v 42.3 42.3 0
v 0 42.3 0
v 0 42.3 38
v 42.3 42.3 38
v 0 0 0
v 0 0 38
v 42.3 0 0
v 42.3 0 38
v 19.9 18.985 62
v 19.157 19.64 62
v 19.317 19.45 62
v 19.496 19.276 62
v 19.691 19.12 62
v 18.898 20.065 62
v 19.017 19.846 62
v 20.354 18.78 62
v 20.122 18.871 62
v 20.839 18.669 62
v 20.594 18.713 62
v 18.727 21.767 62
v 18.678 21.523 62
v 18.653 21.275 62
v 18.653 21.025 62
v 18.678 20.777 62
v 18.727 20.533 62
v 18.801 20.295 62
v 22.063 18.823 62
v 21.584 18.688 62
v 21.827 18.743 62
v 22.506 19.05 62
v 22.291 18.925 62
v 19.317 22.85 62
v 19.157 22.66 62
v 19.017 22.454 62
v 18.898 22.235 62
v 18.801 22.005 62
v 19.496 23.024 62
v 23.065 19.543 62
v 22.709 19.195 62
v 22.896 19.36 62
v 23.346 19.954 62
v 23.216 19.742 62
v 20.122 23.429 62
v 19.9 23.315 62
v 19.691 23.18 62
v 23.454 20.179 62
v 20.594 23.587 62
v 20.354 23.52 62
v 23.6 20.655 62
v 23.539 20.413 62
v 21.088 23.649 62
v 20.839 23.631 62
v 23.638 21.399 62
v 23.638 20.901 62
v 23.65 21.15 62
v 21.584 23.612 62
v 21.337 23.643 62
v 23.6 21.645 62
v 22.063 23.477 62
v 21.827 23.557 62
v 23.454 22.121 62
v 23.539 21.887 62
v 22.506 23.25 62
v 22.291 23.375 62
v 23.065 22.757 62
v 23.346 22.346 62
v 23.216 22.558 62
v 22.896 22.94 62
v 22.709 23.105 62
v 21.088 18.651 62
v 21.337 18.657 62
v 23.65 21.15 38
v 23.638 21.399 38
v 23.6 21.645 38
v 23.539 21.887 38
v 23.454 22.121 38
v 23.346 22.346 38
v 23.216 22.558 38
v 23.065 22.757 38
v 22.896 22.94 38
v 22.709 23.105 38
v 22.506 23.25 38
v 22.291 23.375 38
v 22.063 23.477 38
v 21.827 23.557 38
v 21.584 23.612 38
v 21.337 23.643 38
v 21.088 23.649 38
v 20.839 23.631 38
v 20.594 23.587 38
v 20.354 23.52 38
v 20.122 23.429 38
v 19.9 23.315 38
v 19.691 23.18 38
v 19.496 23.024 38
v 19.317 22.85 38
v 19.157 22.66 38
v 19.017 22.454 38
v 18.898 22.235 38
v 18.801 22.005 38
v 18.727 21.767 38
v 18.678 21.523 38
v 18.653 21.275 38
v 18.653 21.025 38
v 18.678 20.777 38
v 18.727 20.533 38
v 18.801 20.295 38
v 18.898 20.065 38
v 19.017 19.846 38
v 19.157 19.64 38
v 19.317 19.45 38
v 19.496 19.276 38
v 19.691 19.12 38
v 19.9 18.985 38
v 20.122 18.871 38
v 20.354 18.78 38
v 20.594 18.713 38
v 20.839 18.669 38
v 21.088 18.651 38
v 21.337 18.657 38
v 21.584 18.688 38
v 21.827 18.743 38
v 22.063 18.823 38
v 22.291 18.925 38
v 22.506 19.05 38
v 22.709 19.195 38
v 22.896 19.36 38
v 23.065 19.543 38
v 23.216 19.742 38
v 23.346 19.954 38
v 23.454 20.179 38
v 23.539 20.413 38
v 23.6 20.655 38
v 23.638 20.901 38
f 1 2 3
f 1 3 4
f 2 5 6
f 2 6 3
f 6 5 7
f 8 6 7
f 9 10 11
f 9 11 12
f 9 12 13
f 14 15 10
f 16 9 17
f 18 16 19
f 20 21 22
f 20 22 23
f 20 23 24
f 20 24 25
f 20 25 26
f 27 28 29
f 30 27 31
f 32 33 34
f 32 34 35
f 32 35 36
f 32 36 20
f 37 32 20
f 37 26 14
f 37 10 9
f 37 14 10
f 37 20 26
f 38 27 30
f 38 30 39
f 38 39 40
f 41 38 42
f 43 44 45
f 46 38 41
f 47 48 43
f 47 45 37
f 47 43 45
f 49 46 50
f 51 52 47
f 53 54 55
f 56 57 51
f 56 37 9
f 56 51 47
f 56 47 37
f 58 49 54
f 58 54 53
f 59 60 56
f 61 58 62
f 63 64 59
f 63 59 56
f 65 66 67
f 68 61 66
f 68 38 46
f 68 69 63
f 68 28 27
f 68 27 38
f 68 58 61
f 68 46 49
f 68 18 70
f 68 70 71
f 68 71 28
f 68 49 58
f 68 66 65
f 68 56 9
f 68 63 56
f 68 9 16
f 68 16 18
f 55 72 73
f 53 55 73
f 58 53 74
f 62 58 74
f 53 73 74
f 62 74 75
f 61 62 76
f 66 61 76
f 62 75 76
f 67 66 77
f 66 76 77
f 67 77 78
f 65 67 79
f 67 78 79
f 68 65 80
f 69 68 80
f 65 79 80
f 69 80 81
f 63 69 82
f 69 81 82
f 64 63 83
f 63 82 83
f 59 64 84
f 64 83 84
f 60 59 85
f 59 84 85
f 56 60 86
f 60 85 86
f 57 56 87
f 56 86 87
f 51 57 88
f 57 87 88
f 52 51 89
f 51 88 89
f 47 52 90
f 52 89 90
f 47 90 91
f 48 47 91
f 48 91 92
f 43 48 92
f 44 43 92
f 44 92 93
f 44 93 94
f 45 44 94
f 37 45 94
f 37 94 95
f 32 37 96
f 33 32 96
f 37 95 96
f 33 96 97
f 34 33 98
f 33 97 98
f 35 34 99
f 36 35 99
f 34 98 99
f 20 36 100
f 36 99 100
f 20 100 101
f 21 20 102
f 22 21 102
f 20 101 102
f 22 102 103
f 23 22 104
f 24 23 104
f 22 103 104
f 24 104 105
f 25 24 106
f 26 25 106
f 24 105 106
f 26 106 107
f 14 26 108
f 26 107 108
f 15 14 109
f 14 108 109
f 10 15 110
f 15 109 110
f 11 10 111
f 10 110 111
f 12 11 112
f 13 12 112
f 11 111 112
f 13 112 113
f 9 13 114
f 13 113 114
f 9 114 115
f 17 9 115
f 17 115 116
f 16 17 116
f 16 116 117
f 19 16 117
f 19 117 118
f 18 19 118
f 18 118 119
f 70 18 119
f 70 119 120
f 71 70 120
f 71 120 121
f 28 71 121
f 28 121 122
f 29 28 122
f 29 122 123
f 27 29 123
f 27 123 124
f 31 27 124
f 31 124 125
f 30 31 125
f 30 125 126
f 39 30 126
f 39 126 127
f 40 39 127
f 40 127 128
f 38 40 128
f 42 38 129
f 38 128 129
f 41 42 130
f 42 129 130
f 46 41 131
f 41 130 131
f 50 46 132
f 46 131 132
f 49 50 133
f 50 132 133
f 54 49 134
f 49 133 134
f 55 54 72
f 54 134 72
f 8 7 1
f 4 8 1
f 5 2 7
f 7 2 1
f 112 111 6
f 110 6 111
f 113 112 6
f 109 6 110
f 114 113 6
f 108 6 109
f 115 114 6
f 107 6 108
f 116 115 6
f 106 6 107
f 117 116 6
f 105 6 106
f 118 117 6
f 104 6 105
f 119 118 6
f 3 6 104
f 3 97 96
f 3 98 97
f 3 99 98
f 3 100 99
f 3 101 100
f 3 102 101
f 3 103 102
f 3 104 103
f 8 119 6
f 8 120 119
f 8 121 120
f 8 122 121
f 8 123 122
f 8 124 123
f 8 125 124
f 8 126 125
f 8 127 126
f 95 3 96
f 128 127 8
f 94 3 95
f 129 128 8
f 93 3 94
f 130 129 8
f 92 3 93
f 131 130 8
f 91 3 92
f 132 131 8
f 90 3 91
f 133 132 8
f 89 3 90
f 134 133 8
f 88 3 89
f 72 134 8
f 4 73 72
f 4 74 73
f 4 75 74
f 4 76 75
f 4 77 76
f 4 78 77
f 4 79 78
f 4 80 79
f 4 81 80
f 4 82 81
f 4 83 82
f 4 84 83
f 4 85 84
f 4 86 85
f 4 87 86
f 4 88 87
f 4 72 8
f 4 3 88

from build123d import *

# Parameters (mm, degrees)
CYLINDER_R     = 2.5
CYLINDER_DEPTH = 24
BOX_W          = 42.3
BOX_H          = 42.3
BOX_DEPTH      = 38


with BuildPart() as rotor:
    # Cylinder → Cylinder (new body)
    with BuildSketch(Plane(origin=(21.15, 21.15, 38), x_dir=(1, 0, 0), z_dir=(0, 0, 1))):
        Circle(CYLINDER_R)
    extrude(amount=CYLINDER_DEPTH)


with BuildPart() as f_17hs4401:
    # Box → Box (new body)
    with BuildSketch(Plane.XY):
        with Locations((21.15, 21.15)):
            Rectangle(BOX_W, BOX_H)
    extrude(amount=BOX_DEPTH)

    # Fusion: union Rotor
    add(rotor.part)


solid = f_17hs4401.part
